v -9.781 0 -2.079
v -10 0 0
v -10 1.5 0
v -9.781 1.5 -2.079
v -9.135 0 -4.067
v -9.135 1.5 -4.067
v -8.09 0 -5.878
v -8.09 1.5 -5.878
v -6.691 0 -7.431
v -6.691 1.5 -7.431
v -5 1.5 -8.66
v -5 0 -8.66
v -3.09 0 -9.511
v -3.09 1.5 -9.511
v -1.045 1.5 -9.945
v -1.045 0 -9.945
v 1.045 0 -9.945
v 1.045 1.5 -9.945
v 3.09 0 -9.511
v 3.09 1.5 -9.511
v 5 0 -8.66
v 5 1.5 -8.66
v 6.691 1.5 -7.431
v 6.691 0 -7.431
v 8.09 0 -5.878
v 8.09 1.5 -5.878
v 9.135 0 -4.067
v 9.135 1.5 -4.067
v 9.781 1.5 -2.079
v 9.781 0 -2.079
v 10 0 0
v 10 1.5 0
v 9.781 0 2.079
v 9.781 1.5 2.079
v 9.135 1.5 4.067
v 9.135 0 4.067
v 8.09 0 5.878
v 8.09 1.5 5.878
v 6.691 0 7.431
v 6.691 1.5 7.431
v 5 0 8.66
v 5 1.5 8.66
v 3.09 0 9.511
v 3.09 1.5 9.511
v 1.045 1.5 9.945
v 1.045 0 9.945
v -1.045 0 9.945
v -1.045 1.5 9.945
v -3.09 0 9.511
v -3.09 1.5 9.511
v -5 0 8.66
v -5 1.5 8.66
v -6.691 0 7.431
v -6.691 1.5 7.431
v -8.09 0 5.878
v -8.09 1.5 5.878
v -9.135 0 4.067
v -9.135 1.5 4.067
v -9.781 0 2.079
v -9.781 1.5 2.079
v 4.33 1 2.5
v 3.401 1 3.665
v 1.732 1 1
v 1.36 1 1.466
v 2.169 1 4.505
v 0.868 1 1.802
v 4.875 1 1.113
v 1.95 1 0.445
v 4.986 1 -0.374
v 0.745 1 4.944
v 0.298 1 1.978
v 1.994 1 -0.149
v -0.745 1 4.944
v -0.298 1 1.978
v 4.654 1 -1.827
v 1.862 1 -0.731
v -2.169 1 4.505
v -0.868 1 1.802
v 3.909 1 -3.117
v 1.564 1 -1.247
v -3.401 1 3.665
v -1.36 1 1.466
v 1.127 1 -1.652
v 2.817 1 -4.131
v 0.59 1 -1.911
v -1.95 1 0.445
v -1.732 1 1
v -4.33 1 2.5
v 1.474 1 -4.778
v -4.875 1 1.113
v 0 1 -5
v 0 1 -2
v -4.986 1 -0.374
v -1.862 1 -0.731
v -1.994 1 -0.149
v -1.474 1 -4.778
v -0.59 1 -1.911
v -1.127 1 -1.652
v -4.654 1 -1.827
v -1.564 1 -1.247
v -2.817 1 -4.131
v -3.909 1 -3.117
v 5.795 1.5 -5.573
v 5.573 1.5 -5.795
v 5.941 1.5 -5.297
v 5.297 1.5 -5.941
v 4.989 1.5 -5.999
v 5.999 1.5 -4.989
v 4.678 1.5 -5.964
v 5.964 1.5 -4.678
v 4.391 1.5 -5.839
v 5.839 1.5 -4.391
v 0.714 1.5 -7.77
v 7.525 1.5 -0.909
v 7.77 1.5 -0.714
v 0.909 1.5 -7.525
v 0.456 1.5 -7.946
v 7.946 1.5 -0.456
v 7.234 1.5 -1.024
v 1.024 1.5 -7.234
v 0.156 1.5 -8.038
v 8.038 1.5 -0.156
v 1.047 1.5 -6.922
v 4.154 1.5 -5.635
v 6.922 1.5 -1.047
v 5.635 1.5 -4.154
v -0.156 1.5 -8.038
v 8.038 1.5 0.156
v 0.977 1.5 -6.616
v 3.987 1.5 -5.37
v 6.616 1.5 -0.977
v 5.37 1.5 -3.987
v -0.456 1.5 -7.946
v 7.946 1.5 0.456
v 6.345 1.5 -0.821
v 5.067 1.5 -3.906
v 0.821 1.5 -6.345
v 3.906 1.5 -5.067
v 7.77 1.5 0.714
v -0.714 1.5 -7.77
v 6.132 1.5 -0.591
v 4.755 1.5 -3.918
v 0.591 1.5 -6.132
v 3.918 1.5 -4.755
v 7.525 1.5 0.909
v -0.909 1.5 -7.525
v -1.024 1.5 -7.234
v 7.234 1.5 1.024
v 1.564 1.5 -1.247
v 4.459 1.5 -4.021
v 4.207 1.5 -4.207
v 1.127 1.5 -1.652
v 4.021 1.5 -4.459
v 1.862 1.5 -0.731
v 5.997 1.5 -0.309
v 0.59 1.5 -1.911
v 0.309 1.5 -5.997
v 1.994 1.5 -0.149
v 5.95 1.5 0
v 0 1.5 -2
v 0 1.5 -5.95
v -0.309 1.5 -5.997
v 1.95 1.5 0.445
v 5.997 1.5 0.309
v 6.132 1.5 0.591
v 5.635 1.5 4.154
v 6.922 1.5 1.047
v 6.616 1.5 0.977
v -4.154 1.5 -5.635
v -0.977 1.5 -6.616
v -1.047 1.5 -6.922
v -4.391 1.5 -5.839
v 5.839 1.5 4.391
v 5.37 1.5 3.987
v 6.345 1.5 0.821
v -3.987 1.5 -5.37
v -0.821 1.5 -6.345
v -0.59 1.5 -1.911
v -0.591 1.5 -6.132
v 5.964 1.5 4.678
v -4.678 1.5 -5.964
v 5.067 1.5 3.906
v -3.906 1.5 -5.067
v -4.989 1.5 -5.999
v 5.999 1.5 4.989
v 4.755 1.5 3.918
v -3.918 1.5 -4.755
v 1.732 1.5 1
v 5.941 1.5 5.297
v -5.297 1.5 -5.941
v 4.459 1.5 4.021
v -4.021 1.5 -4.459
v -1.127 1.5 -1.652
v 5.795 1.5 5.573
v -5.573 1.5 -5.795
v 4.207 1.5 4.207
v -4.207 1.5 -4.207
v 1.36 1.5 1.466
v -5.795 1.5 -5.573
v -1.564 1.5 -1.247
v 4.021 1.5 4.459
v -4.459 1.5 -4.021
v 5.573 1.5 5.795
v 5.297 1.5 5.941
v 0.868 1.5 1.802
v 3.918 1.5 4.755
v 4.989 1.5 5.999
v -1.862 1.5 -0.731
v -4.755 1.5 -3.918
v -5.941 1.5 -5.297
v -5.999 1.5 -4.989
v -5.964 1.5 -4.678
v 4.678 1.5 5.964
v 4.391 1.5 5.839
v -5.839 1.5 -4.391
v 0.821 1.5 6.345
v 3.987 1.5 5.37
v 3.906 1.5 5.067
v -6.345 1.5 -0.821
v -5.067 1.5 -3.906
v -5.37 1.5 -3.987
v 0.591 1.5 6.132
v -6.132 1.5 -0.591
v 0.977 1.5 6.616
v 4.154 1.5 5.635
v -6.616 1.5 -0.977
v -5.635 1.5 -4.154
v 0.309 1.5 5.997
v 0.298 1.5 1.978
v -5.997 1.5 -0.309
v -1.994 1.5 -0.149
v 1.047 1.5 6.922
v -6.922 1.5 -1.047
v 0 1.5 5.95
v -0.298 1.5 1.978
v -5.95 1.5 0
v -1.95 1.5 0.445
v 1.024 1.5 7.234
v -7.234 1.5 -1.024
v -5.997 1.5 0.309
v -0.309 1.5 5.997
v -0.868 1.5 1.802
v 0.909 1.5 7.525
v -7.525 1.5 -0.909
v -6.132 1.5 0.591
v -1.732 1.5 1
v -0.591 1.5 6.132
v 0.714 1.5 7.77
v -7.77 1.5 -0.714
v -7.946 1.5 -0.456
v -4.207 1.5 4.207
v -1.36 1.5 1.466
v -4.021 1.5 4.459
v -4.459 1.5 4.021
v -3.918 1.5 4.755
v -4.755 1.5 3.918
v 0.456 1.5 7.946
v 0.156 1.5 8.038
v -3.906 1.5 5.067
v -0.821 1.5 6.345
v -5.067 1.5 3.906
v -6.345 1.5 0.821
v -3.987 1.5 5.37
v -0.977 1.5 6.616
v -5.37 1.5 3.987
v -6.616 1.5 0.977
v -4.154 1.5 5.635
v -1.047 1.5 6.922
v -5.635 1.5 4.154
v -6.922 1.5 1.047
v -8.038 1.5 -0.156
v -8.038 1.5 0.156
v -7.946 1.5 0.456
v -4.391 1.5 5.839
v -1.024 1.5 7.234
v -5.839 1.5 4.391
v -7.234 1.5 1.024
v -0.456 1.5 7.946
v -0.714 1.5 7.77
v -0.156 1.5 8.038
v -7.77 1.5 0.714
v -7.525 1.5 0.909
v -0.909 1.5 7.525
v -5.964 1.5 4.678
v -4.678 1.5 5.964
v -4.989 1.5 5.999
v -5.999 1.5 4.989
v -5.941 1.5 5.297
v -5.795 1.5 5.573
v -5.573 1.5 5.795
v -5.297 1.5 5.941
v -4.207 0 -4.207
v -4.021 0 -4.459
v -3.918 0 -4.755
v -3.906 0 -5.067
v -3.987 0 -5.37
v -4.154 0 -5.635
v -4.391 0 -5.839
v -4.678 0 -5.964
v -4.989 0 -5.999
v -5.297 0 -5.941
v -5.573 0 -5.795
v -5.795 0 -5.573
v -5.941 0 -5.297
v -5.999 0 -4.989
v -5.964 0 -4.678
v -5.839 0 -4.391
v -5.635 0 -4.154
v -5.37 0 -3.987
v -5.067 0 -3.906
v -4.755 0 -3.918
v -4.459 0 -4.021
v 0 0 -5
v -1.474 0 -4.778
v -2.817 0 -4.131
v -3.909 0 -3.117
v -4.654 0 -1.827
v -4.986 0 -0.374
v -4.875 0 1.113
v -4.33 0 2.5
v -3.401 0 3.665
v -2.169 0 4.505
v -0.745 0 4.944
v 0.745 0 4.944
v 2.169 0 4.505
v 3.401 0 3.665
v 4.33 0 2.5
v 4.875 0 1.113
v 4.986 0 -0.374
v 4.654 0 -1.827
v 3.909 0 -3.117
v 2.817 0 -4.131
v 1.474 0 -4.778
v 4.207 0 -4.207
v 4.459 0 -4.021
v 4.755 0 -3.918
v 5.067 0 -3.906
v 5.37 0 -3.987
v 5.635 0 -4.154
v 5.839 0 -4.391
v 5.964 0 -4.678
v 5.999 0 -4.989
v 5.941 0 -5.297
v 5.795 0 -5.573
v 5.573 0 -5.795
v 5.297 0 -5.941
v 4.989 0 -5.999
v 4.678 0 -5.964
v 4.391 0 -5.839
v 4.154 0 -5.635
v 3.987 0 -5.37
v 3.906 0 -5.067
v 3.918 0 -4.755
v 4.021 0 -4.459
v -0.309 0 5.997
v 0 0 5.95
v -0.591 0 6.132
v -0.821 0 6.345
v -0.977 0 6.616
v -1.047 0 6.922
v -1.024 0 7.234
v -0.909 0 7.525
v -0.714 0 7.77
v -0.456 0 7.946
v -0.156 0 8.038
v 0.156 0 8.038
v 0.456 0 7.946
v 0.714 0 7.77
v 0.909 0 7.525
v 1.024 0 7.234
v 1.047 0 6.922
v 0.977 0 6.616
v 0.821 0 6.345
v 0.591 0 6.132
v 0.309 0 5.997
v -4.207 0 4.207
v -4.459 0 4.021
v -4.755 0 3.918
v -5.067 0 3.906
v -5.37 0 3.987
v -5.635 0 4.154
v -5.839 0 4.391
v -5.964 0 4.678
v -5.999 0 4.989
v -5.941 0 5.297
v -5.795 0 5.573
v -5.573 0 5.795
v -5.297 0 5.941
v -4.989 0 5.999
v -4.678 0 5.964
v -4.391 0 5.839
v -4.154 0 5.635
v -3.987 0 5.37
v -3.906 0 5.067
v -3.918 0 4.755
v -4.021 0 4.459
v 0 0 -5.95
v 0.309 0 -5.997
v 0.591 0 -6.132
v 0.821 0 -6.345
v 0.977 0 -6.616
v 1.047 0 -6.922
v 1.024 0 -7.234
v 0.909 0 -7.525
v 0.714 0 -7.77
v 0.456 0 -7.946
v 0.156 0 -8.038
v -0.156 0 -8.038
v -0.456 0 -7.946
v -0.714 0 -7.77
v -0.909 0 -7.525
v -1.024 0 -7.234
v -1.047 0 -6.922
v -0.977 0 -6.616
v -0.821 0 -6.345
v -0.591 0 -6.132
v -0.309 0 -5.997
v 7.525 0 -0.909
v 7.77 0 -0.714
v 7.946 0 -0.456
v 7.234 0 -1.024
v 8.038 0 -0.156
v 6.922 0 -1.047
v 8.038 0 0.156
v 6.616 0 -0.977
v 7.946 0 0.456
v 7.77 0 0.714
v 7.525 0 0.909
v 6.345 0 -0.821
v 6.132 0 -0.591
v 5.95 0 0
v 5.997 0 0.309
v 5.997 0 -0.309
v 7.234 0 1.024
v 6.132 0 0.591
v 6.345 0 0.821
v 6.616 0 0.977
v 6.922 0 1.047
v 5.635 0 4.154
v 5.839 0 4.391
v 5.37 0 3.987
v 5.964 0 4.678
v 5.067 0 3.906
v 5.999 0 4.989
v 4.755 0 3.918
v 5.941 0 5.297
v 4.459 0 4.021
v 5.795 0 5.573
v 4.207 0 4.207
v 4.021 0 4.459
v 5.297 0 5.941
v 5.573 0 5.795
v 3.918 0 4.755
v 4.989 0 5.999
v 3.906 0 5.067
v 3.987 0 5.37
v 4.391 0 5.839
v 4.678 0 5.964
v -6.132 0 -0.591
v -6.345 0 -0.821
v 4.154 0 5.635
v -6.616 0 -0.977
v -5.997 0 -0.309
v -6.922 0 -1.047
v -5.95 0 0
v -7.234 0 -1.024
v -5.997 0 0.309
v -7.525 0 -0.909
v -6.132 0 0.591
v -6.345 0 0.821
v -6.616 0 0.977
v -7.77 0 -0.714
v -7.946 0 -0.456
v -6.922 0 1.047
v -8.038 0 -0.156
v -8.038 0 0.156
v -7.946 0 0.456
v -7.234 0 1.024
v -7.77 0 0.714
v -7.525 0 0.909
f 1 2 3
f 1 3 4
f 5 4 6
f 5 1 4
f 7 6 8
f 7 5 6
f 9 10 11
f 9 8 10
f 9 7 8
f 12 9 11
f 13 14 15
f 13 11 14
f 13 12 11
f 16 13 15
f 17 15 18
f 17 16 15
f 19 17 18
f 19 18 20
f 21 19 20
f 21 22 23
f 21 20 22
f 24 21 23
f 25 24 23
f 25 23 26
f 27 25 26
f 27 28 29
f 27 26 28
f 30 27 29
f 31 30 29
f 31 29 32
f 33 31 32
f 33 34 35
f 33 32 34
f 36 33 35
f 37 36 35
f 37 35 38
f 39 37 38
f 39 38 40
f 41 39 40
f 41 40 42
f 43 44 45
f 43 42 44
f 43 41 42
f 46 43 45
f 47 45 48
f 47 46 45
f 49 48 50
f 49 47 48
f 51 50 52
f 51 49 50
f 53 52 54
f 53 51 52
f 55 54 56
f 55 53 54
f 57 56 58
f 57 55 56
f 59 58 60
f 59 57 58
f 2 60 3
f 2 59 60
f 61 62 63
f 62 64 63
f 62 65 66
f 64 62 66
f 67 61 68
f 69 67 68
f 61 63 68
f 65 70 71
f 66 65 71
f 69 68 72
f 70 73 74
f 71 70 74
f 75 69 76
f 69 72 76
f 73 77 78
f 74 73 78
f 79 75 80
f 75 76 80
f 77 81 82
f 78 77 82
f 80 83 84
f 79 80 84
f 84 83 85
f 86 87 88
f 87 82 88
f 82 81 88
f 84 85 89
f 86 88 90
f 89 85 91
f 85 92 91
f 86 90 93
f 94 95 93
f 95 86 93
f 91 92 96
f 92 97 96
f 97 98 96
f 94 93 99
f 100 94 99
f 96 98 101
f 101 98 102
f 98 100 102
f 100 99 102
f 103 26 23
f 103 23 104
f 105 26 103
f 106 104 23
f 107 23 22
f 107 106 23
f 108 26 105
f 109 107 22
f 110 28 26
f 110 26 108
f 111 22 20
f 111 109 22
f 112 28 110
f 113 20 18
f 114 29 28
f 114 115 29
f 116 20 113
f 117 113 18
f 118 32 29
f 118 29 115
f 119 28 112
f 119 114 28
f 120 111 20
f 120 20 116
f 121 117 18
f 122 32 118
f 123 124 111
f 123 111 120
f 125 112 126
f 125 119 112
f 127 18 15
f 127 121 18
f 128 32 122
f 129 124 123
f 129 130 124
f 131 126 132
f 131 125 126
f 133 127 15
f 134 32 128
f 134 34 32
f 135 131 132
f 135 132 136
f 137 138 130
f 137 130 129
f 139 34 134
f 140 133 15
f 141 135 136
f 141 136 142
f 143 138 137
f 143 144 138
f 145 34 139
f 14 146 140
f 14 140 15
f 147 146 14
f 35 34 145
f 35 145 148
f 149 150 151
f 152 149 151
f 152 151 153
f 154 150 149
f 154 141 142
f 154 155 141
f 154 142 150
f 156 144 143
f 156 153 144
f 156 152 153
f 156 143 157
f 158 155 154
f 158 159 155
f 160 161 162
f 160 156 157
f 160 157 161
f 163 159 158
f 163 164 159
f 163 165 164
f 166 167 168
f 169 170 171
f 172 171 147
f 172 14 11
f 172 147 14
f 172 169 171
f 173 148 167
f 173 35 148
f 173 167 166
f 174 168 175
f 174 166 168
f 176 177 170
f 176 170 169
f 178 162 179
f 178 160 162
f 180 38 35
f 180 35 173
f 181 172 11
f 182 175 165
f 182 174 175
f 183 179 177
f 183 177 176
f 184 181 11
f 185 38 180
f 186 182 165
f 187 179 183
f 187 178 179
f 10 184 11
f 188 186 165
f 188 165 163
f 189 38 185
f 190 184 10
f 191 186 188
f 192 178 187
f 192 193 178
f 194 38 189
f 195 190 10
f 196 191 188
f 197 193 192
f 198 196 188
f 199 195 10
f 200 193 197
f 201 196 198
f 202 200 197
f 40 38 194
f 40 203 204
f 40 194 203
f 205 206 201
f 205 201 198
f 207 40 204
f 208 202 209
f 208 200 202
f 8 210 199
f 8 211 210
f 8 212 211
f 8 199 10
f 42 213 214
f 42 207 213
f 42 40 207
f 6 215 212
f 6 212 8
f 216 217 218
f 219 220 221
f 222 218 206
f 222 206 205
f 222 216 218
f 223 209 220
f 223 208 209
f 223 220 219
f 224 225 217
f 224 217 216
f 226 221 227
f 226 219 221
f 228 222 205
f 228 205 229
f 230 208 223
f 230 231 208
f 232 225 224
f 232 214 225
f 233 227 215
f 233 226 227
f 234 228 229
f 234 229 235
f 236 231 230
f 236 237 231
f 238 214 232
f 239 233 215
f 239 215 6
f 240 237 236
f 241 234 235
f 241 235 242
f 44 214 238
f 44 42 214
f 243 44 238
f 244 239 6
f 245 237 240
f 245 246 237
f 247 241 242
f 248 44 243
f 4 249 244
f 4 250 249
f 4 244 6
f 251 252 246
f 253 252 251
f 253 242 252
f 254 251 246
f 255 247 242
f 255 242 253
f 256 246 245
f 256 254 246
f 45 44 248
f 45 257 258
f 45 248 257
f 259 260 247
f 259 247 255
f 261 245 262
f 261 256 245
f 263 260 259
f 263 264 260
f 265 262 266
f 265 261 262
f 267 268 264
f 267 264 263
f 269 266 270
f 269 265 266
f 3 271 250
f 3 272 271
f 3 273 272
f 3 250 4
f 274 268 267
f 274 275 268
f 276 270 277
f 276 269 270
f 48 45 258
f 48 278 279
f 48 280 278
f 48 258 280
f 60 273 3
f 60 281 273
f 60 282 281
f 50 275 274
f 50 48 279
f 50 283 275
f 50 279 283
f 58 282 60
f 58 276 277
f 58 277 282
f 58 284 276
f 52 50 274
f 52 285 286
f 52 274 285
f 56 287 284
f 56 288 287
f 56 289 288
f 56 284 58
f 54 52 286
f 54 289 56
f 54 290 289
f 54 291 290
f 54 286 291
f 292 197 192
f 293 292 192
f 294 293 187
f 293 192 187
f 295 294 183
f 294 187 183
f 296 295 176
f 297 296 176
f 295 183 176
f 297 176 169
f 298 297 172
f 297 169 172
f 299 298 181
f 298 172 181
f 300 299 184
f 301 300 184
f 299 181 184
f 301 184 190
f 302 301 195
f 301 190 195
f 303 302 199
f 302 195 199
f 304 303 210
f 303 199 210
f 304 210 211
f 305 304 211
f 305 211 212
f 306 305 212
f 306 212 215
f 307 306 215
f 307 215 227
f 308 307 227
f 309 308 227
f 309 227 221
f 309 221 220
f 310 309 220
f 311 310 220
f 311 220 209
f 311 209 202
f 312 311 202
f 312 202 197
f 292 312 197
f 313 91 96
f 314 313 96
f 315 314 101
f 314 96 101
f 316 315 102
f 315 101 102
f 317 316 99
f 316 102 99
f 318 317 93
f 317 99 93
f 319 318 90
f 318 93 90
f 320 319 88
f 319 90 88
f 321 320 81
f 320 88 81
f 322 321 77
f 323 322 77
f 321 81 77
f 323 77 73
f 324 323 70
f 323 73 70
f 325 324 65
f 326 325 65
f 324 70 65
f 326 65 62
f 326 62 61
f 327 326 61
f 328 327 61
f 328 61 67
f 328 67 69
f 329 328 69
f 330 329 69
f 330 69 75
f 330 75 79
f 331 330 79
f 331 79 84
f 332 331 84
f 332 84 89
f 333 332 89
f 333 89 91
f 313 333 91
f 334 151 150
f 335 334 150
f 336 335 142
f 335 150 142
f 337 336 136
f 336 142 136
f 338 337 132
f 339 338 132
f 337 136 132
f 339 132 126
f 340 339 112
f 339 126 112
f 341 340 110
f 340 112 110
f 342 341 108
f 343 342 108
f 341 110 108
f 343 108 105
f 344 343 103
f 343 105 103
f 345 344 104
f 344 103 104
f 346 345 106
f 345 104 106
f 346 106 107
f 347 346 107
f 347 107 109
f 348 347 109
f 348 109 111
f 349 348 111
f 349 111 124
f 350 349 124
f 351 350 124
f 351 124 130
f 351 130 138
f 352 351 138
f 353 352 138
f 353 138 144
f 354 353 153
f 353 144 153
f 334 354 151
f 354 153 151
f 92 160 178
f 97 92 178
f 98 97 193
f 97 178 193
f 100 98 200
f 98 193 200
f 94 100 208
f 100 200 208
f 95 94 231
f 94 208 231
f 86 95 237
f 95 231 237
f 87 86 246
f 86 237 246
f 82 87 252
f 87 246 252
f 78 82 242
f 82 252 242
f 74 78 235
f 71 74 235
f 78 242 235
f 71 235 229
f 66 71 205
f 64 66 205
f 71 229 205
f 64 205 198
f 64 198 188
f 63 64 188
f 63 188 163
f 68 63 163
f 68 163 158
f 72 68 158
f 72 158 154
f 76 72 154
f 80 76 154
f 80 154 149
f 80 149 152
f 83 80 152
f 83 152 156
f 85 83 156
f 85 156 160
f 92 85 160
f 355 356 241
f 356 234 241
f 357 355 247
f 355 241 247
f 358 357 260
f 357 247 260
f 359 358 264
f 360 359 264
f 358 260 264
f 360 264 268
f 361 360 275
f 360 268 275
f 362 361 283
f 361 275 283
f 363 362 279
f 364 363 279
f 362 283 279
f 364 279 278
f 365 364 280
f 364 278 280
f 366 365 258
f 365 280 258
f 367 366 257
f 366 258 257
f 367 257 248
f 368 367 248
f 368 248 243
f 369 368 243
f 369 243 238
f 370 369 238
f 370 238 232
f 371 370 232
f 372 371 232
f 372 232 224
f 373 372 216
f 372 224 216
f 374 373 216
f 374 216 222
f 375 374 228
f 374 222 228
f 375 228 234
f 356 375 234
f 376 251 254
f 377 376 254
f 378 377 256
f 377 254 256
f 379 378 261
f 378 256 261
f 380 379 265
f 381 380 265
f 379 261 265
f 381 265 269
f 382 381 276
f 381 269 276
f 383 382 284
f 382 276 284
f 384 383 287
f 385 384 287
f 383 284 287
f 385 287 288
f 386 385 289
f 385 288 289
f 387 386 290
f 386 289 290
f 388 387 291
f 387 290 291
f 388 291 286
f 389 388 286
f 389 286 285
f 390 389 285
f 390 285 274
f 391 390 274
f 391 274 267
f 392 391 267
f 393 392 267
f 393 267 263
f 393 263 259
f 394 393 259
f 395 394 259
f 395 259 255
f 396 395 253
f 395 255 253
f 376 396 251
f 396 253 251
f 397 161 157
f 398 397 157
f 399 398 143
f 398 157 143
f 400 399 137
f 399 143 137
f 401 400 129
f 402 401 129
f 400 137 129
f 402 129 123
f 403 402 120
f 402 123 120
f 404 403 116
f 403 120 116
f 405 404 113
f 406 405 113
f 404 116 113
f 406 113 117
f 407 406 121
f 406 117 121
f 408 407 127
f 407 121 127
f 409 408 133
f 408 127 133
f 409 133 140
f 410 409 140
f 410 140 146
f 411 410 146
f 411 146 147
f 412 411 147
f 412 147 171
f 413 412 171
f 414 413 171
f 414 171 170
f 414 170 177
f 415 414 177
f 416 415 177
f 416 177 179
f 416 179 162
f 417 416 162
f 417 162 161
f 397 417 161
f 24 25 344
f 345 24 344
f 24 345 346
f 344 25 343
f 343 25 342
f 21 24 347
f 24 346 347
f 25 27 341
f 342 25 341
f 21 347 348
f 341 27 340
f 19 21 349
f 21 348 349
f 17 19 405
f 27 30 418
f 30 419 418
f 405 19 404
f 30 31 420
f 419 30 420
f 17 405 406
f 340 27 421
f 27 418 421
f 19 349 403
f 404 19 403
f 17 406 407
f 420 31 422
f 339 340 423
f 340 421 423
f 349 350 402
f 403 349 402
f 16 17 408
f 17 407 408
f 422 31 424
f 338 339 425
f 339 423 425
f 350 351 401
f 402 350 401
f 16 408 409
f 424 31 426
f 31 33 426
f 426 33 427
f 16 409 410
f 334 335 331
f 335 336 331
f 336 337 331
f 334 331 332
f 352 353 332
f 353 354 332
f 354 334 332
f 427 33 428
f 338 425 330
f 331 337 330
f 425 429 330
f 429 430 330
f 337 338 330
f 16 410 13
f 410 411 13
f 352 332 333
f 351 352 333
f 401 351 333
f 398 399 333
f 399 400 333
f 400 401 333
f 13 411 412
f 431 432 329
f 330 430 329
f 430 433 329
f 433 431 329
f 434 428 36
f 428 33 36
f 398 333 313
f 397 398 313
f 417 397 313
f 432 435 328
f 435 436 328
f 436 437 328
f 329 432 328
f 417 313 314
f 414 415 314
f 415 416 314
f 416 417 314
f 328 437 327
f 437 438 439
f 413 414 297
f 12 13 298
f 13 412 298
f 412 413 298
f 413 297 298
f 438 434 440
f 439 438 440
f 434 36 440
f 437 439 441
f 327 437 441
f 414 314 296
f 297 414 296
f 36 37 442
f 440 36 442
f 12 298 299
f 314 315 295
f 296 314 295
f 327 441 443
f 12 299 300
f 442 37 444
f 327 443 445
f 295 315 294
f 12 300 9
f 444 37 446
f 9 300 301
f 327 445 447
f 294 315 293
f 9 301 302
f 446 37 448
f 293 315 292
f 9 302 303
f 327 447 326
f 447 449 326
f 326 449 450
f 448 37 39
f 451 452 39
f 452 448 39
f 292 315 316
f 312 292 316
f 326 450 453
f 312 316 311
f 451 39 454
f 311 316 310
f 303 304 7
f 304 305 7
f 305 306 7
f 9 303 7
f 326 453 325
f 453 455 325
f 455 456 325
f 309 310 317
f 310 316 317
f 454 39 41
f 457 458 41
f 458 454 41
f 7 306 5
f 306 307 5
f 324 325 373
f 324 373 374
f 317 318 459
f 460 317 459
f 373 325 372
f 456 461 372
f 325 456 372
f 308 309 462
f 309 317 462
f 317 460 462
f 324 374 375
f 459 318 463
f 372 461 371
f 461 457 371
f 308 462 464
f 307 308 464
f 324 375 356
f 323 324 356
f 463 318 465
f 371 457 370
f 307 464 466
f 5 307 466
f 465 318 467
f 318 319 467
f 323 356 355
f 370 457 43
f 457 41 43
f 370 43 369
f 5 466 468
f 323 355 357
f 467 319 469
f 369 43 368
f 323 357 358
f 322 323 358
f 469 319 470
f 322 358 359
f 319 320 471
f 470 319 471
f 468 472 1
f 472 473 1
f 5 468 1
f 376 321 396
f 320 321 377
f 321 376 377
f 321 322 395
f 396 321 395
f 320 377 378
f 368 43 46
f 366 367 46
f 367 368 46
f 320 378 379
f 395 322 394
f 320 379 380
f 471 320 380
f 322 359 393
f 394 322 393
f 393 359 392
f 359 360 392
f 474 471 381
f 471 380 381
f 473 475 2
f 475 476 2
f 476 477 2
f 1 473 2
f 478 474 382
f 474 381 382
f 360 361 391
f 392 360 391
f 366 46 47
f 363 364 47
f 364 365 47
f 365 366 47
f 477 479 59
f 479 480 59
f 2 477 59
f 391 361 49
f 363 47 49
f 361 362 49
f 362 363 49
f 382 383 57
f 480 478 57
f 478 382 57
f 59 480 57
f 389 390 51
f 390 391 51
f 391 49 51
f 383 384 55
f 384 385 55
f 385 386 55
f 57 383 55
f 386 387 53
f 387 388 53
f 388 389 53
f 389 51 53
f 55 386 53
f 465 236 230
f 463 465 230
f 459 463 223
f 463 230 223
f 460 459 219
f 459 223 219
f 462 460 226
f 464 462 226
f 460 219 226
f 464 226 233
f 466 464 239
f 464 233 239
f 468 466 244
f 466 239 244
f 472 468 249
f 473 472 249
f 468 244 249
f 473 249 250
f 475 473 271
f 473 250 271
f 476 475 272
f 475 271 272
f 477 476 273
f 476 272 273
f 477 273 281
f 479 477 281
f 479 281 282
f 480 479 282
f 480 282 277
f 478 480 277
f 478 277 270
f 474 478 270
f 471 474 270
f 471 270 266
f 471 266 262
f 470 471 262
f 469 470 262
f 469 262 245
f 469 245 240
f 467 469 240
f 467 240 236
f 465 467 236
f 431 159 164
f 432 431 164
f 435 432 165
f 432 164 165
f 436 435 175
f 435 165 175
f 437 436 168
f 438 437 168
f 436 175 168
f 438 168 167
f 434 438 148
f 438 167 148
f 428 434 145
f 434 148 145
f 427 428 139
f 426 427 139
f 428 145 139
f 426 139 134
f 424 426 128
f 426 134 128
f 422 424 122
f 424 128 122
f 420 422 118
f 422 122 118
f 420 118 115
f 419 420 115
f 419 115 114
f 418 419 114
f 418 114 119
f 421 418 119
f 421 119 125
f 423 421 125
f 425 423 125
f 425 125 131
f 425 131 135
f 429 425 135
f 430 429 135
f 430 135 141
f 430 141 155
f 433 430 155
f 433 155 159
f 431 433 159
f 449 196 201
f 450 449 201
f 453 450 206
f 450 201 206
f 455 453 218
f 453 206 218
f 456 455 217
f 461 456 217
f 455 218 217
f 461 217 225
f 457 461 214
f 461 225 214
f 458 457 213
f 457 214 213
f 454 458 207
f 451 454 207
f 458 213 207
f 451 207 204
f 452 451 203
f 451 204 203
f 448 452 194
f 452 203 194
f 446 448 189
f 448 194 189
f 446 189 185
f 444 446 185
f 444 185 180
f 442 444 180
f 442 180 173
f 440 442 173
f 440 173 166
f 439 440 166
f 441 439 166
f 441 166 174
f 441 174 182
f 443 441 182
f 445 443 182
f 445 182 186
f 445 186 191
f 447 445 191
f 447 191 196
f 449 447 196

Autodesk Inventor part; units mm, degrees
ref_plane "YZ Plane" through (0, 0, 0) normal (1, 0, 0) x (0, 1, 0)
ref_plane "XZ Plane" through (0, 0, 0) normal (0, 1, 0) x (-1, 0, 0)
ref_plane "XY Plane" through (0, 0, 0) normal (0, 0, 1) x (1, 0, 0)
sketch "スケッチ1" plane through (0, 0, 0) normal (0, 1, 0) x (-1, 0, 0)
  circle A0 centre (0, 0) radius 10
  dimension "d0" = 20
extrude "押し出し2" add sketch "スケッチ1" along normal blind 1.5
sketch "スケッチ3" plane through (0, 0, 0) normal (0, -1, 0) x (1, 0, 0)
  circle A0 centre (0, 0) radius 10 projected
  circle A1 centre (0, 0) radius 2
  dimension "d21" = 4
hole "穴2" at (0, 0, 0) direction (0, 1, 0) diameter 4 end through all counterbore diameter 10 counterbore depth 1
sketch "スケッチ4" plane through (0, 0, 0) normal (0, -1, 0) x (1, 0, 0)
  circle A0 centre (0, 0) radius 5 projected
  circle A1 centre (0, 7) radius 1
  dimension "d30" = 0
  dimension "d31" = 7
  dimension "d32" = 2
hole "穴3" at (0, 0, 7) direction (0, 1, 0) diameter 2.1 end through all
pattern_circular "円形状パターン2" count 8 over 360 about axis through (0, 0.5, 0) along (0, -1, 0) of "穴3"
properties part number "13" material "アセタール樹脂、白"
